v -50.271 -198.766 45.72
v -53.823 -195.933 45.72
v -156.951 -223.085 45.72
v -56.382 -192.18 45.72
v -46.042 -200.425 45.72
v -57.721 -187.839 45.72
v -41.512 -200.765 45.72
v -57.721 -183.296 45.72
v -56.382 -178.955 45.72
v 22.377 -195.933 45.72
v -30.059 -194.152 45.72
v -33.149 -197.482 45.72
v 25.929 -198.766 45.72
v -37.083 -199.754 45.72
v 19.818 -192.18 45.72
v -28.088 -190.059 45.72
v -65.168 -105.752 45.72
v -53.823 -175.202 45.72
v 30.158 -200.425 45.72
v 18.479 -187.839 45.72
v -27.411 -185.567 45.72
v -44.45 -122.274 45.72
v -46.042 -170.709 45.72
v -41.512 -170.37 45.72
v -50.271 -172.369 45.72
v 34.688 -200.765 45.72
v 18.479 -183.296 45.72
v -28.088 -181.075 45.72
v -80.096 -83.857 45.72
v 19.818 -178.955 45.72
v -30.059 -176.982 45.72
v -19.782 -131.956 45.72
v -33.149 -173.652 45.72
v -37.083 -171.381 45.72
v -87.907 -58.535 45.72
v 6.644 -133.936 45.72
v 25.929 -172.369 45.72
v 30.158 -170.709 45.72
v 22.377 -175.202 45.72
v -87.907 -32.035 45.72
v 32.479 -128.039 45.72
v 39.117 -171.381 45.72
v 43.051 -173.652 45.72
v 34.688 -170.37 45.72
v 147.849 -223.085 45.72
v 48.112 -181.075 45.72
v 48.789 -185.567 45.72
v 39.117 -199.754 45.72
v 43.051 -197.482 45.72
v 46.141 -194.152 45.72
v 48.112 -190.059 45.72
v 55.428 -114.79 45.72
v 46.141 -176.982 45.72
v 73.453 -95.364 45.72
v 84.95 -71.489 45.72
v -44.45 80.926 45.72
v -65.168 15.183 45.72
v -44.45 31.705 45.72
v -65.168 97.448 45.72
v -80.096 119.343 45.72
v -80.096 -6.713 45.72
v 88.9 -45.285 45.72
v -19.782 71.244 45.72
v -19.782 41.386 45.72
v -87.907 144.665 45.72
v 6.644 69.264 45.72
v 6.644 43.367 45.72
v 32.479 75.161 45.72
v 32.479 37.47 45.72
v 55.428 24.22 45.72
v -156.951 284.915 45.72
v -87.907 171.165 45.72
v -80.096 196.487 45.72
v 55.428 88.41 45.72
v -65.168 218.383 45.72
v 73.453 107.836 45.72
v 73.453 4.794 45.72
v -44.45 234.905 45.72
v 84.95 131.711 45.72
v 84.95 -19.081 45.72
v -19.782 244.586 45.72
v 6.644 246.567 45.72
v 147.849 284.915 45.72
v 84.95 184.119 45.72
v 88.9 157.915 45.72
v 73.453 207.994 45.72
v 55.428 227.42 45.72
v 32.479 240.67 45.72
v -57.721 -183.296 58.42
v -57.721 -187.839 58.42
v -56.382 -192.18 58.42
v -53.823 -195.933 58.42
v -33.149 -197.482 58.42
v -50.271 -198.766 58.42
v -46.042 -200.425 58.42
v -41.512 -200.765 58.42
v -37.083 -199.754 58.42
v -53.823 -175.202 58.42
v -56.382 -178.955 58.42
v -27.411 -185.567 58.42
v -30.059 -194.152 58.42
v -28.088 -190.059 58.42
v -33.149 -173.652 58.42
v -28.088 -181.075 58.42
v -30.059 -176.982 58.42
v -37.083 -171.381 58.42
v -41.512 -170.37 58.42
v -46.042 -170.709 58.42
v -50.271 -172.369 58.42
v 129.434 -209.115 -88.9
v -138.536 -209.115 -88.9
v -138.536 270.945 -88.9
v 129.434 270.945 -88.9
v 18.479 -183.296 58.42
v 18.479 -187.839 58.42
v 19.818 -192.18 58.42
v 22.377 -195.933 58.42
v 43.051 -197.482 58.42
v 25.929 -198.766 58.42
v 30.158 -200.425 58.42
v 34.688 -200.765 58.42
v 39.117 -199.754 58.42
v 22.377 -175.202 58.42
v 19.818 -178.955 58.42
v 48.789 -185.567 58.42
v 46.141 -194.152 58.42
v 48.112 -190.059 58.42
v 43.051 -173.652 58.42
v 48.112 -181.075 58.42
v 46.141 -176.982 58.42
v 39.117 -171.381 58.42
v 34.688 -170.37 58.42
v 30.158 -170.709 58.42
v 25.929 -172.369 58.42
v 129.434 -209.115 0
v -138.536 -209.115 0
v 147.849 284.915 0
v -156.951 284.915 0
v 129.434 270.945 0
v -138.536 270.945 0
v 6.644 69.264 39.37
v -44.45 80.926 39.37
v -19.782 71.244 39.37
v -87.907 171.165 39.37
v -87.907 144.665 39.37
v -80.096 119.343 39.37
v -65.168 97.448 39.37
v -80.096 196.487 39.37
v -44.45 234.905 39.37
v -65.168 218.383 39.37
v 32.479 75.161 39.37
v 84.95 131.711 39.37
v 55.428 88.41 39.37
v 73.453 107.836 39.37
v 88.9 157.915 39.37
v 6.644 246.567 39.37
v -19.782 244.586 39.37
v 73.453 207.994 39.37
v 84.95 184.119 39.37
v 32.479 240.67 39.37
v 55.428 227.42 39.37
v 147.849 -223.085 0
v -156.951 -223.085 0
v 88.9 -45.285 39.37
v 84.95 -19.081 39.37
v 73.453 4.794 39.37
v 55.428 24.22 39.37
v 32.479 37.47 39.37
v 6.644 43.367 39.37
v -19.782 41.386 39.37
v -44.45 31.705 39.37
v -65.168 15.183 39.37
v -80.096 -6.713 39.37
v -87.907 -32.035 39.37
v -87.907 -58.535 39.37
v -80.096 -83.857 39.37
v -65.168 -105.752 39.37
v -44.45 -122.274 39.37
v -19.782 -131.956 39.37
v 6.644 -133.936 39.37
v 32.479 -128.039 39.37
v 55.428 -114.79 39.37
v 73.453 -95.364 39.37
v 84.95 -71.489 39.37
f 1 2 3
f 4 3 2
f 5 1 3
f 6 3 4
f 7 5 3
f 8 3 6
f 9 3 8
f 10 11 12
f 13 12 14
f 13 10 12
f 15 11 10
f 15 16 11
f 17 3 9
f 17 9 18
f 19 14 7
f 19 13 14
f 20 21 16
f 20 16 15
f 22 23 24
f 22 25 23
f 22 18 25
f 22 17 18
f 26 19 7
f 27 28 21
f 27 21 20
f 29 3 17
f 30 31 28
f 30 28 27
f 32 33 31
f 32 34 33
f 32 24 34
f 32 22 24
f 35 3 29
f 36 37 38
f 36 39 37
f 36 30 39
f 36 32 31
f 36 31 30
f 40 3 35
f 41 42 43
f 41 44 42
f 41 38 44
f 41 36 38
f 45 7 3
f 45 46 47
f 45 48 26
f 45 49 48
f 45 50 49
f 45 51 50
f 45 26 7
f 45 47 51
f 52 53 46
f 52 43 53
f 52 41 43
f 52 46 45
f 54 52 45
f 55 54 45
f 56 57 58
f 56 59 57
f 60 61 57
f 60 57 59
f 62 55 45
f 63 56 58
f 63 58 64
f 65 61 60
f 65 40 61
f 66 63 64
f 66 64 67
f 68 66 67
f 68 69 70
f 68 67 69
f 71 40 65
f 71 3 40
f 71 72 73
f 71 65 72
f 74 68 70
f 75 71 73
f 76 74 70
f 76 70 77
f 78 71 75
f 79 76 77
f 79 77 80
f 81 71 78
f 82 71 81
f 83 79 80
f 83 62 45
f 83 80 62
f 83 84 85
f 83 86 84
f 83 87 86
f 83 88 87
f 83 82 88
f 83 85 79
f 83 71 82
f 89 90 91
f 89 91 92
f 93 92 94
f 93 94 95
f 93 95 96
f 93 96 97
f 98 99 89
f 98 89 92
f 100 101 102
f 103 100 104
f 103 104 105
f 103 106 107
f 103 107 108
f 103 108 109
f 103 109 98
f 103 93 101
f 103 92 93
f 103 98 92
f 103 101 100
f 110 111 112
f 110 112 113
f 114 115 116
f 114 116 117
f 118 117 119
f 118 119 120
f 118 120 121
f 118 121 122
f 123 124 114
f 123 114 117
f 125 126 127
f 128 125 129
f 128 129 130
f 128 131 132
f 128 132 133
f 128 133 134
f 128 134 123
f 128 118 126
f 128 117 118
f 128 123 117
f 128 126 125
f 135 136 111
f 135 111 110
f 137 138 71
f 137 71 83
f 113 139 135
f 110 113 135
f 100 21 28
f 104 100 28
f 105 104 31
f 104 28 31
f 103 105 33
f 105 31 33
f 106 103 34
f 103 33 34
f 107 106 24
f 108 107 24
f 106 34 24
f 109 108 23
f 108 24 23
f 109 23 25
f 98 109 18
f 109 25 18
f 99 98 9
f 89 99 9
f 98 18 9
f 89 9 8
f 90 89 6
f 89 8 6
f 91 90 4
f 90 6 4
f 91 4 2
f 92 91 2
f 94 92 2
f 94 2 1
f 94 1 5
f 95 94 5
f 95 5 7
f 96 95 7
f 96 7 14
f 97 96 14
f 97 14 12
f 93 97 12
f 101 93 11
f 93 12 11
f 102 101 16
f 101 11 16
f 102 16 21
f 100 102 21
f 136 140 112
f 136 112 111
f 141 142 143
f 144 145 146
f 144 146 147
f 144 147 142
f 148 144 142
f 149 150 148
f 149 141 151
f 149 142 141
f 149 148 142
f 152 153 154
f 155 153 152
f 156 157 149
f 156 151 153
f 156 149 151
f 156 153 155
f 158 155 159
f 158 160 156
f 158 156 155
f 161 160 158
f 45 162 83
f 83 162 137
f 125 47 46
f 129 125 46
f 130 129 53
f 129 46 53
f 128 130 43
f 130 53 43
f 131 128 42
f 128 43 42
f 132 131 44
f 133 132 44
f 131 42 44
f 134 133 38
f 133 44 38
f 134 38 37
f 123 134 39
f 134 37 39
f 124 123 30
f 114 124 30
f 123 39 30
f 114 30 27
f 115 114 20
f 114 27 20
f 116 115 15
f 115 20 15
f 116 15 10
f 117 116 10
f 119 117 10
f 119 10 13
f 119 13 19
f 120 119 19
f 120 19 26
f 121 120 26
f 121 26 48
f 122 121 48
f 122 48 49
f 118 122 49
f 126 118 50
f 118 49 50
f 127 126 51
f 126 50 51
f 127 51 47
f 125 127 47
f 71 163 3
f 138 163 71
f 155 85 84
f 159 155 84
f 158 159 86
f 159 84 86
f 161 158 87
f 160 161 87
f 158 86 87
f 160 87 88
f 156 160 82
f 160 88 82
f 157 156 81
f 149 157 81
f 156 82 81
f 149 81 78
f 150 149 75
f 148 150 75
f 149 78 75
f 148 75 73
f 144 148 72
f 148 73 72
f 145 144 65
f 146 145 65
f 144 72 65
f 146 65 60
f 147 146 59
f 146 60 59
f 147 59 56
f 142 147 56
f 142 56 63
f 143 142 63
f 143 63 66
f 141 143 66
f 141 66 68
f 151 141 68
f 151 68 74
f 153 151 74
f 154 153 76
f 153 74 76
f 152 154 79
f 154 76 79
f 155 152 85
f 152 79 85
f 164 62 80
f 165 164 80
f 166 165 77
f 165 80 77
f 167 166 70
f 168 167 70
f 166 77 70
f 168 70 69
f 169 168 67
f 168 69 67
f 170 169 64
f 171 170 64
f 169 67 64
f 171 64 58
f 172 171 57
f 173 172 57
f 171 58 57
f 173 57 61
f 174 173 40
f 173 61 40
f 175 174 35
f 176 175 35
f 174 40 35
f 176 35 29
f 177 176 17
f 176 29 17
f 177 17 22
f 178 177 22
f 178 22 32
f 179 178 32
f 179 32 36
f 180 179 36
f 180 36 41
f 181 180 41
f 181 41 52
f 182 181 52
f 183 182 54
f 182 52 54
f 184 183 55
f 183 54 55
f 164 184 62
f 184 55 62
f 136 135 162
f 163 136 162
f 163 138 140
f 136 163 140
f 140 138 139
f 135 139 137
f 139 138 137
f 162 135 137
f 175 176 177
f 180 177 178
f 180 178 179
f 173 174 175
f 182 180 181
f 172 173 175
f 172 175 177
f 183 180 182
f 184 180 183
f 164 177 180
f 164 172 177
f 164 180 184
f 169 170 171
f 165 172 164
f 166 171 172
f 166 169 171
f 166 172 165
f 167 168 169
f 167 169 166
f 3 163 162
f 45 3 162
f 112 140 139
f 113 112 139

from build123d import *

# Parameters (mm, degrees)
F0_W     = 304.8
F0_H     = 508
F1_DEPTH = 45.72
F3_W     = 267.97
F3_H     = 480.06
F4_DEPTH = 88.9
F5_R     = 88.9
F6_DEPTH = 6.35
F7_R     = 15.24
F8_DEPTH = 12.7


with BuildPart() as f1:
    # F0 (on Top) → F1 (new body)
    with BuildSketch(Plane.XY):
        with Locations((-4.550833, 30.915228)):
            Rectangle(F0_W, F0_H)
    extrude(amount=F1_DEPTH)

    # F3 (on face) → F4 (join)
    with BuildSketch(Plane(origin=(0, 0, 0), x_dir=(1, 0, 0), z_dir=(0, 0, -1))):
        with Locations((-4.550833, -30.915228)):
            Rectangle(F3_W, F3_H)
    extrude(amount=F4_DEPTH)

    # F5 (on face) → F6 (cut)
    with BuildSketch(Plane.XY.offset(45.72)):
        with Locations((0, 157.915228)):
            Circle(F5_R)
        with Locations((0, -45.284772)):
            Circle(F5_R)
    extrude(amount=-F6_DEPTH, mode=Mode.SUBTRACT)

    # F7 (on face) → F8 (join)
    with BuildSketch(Plane.XY.offset(45.72)):
        with Locations((-42.650833, -185.567364)):
            Circle(F7_R)
        with Locations((33.549167, -185.567364)):
            Circle(F7_R)
    extrude(amount=F8_DEPTH)


solid = f1.part
